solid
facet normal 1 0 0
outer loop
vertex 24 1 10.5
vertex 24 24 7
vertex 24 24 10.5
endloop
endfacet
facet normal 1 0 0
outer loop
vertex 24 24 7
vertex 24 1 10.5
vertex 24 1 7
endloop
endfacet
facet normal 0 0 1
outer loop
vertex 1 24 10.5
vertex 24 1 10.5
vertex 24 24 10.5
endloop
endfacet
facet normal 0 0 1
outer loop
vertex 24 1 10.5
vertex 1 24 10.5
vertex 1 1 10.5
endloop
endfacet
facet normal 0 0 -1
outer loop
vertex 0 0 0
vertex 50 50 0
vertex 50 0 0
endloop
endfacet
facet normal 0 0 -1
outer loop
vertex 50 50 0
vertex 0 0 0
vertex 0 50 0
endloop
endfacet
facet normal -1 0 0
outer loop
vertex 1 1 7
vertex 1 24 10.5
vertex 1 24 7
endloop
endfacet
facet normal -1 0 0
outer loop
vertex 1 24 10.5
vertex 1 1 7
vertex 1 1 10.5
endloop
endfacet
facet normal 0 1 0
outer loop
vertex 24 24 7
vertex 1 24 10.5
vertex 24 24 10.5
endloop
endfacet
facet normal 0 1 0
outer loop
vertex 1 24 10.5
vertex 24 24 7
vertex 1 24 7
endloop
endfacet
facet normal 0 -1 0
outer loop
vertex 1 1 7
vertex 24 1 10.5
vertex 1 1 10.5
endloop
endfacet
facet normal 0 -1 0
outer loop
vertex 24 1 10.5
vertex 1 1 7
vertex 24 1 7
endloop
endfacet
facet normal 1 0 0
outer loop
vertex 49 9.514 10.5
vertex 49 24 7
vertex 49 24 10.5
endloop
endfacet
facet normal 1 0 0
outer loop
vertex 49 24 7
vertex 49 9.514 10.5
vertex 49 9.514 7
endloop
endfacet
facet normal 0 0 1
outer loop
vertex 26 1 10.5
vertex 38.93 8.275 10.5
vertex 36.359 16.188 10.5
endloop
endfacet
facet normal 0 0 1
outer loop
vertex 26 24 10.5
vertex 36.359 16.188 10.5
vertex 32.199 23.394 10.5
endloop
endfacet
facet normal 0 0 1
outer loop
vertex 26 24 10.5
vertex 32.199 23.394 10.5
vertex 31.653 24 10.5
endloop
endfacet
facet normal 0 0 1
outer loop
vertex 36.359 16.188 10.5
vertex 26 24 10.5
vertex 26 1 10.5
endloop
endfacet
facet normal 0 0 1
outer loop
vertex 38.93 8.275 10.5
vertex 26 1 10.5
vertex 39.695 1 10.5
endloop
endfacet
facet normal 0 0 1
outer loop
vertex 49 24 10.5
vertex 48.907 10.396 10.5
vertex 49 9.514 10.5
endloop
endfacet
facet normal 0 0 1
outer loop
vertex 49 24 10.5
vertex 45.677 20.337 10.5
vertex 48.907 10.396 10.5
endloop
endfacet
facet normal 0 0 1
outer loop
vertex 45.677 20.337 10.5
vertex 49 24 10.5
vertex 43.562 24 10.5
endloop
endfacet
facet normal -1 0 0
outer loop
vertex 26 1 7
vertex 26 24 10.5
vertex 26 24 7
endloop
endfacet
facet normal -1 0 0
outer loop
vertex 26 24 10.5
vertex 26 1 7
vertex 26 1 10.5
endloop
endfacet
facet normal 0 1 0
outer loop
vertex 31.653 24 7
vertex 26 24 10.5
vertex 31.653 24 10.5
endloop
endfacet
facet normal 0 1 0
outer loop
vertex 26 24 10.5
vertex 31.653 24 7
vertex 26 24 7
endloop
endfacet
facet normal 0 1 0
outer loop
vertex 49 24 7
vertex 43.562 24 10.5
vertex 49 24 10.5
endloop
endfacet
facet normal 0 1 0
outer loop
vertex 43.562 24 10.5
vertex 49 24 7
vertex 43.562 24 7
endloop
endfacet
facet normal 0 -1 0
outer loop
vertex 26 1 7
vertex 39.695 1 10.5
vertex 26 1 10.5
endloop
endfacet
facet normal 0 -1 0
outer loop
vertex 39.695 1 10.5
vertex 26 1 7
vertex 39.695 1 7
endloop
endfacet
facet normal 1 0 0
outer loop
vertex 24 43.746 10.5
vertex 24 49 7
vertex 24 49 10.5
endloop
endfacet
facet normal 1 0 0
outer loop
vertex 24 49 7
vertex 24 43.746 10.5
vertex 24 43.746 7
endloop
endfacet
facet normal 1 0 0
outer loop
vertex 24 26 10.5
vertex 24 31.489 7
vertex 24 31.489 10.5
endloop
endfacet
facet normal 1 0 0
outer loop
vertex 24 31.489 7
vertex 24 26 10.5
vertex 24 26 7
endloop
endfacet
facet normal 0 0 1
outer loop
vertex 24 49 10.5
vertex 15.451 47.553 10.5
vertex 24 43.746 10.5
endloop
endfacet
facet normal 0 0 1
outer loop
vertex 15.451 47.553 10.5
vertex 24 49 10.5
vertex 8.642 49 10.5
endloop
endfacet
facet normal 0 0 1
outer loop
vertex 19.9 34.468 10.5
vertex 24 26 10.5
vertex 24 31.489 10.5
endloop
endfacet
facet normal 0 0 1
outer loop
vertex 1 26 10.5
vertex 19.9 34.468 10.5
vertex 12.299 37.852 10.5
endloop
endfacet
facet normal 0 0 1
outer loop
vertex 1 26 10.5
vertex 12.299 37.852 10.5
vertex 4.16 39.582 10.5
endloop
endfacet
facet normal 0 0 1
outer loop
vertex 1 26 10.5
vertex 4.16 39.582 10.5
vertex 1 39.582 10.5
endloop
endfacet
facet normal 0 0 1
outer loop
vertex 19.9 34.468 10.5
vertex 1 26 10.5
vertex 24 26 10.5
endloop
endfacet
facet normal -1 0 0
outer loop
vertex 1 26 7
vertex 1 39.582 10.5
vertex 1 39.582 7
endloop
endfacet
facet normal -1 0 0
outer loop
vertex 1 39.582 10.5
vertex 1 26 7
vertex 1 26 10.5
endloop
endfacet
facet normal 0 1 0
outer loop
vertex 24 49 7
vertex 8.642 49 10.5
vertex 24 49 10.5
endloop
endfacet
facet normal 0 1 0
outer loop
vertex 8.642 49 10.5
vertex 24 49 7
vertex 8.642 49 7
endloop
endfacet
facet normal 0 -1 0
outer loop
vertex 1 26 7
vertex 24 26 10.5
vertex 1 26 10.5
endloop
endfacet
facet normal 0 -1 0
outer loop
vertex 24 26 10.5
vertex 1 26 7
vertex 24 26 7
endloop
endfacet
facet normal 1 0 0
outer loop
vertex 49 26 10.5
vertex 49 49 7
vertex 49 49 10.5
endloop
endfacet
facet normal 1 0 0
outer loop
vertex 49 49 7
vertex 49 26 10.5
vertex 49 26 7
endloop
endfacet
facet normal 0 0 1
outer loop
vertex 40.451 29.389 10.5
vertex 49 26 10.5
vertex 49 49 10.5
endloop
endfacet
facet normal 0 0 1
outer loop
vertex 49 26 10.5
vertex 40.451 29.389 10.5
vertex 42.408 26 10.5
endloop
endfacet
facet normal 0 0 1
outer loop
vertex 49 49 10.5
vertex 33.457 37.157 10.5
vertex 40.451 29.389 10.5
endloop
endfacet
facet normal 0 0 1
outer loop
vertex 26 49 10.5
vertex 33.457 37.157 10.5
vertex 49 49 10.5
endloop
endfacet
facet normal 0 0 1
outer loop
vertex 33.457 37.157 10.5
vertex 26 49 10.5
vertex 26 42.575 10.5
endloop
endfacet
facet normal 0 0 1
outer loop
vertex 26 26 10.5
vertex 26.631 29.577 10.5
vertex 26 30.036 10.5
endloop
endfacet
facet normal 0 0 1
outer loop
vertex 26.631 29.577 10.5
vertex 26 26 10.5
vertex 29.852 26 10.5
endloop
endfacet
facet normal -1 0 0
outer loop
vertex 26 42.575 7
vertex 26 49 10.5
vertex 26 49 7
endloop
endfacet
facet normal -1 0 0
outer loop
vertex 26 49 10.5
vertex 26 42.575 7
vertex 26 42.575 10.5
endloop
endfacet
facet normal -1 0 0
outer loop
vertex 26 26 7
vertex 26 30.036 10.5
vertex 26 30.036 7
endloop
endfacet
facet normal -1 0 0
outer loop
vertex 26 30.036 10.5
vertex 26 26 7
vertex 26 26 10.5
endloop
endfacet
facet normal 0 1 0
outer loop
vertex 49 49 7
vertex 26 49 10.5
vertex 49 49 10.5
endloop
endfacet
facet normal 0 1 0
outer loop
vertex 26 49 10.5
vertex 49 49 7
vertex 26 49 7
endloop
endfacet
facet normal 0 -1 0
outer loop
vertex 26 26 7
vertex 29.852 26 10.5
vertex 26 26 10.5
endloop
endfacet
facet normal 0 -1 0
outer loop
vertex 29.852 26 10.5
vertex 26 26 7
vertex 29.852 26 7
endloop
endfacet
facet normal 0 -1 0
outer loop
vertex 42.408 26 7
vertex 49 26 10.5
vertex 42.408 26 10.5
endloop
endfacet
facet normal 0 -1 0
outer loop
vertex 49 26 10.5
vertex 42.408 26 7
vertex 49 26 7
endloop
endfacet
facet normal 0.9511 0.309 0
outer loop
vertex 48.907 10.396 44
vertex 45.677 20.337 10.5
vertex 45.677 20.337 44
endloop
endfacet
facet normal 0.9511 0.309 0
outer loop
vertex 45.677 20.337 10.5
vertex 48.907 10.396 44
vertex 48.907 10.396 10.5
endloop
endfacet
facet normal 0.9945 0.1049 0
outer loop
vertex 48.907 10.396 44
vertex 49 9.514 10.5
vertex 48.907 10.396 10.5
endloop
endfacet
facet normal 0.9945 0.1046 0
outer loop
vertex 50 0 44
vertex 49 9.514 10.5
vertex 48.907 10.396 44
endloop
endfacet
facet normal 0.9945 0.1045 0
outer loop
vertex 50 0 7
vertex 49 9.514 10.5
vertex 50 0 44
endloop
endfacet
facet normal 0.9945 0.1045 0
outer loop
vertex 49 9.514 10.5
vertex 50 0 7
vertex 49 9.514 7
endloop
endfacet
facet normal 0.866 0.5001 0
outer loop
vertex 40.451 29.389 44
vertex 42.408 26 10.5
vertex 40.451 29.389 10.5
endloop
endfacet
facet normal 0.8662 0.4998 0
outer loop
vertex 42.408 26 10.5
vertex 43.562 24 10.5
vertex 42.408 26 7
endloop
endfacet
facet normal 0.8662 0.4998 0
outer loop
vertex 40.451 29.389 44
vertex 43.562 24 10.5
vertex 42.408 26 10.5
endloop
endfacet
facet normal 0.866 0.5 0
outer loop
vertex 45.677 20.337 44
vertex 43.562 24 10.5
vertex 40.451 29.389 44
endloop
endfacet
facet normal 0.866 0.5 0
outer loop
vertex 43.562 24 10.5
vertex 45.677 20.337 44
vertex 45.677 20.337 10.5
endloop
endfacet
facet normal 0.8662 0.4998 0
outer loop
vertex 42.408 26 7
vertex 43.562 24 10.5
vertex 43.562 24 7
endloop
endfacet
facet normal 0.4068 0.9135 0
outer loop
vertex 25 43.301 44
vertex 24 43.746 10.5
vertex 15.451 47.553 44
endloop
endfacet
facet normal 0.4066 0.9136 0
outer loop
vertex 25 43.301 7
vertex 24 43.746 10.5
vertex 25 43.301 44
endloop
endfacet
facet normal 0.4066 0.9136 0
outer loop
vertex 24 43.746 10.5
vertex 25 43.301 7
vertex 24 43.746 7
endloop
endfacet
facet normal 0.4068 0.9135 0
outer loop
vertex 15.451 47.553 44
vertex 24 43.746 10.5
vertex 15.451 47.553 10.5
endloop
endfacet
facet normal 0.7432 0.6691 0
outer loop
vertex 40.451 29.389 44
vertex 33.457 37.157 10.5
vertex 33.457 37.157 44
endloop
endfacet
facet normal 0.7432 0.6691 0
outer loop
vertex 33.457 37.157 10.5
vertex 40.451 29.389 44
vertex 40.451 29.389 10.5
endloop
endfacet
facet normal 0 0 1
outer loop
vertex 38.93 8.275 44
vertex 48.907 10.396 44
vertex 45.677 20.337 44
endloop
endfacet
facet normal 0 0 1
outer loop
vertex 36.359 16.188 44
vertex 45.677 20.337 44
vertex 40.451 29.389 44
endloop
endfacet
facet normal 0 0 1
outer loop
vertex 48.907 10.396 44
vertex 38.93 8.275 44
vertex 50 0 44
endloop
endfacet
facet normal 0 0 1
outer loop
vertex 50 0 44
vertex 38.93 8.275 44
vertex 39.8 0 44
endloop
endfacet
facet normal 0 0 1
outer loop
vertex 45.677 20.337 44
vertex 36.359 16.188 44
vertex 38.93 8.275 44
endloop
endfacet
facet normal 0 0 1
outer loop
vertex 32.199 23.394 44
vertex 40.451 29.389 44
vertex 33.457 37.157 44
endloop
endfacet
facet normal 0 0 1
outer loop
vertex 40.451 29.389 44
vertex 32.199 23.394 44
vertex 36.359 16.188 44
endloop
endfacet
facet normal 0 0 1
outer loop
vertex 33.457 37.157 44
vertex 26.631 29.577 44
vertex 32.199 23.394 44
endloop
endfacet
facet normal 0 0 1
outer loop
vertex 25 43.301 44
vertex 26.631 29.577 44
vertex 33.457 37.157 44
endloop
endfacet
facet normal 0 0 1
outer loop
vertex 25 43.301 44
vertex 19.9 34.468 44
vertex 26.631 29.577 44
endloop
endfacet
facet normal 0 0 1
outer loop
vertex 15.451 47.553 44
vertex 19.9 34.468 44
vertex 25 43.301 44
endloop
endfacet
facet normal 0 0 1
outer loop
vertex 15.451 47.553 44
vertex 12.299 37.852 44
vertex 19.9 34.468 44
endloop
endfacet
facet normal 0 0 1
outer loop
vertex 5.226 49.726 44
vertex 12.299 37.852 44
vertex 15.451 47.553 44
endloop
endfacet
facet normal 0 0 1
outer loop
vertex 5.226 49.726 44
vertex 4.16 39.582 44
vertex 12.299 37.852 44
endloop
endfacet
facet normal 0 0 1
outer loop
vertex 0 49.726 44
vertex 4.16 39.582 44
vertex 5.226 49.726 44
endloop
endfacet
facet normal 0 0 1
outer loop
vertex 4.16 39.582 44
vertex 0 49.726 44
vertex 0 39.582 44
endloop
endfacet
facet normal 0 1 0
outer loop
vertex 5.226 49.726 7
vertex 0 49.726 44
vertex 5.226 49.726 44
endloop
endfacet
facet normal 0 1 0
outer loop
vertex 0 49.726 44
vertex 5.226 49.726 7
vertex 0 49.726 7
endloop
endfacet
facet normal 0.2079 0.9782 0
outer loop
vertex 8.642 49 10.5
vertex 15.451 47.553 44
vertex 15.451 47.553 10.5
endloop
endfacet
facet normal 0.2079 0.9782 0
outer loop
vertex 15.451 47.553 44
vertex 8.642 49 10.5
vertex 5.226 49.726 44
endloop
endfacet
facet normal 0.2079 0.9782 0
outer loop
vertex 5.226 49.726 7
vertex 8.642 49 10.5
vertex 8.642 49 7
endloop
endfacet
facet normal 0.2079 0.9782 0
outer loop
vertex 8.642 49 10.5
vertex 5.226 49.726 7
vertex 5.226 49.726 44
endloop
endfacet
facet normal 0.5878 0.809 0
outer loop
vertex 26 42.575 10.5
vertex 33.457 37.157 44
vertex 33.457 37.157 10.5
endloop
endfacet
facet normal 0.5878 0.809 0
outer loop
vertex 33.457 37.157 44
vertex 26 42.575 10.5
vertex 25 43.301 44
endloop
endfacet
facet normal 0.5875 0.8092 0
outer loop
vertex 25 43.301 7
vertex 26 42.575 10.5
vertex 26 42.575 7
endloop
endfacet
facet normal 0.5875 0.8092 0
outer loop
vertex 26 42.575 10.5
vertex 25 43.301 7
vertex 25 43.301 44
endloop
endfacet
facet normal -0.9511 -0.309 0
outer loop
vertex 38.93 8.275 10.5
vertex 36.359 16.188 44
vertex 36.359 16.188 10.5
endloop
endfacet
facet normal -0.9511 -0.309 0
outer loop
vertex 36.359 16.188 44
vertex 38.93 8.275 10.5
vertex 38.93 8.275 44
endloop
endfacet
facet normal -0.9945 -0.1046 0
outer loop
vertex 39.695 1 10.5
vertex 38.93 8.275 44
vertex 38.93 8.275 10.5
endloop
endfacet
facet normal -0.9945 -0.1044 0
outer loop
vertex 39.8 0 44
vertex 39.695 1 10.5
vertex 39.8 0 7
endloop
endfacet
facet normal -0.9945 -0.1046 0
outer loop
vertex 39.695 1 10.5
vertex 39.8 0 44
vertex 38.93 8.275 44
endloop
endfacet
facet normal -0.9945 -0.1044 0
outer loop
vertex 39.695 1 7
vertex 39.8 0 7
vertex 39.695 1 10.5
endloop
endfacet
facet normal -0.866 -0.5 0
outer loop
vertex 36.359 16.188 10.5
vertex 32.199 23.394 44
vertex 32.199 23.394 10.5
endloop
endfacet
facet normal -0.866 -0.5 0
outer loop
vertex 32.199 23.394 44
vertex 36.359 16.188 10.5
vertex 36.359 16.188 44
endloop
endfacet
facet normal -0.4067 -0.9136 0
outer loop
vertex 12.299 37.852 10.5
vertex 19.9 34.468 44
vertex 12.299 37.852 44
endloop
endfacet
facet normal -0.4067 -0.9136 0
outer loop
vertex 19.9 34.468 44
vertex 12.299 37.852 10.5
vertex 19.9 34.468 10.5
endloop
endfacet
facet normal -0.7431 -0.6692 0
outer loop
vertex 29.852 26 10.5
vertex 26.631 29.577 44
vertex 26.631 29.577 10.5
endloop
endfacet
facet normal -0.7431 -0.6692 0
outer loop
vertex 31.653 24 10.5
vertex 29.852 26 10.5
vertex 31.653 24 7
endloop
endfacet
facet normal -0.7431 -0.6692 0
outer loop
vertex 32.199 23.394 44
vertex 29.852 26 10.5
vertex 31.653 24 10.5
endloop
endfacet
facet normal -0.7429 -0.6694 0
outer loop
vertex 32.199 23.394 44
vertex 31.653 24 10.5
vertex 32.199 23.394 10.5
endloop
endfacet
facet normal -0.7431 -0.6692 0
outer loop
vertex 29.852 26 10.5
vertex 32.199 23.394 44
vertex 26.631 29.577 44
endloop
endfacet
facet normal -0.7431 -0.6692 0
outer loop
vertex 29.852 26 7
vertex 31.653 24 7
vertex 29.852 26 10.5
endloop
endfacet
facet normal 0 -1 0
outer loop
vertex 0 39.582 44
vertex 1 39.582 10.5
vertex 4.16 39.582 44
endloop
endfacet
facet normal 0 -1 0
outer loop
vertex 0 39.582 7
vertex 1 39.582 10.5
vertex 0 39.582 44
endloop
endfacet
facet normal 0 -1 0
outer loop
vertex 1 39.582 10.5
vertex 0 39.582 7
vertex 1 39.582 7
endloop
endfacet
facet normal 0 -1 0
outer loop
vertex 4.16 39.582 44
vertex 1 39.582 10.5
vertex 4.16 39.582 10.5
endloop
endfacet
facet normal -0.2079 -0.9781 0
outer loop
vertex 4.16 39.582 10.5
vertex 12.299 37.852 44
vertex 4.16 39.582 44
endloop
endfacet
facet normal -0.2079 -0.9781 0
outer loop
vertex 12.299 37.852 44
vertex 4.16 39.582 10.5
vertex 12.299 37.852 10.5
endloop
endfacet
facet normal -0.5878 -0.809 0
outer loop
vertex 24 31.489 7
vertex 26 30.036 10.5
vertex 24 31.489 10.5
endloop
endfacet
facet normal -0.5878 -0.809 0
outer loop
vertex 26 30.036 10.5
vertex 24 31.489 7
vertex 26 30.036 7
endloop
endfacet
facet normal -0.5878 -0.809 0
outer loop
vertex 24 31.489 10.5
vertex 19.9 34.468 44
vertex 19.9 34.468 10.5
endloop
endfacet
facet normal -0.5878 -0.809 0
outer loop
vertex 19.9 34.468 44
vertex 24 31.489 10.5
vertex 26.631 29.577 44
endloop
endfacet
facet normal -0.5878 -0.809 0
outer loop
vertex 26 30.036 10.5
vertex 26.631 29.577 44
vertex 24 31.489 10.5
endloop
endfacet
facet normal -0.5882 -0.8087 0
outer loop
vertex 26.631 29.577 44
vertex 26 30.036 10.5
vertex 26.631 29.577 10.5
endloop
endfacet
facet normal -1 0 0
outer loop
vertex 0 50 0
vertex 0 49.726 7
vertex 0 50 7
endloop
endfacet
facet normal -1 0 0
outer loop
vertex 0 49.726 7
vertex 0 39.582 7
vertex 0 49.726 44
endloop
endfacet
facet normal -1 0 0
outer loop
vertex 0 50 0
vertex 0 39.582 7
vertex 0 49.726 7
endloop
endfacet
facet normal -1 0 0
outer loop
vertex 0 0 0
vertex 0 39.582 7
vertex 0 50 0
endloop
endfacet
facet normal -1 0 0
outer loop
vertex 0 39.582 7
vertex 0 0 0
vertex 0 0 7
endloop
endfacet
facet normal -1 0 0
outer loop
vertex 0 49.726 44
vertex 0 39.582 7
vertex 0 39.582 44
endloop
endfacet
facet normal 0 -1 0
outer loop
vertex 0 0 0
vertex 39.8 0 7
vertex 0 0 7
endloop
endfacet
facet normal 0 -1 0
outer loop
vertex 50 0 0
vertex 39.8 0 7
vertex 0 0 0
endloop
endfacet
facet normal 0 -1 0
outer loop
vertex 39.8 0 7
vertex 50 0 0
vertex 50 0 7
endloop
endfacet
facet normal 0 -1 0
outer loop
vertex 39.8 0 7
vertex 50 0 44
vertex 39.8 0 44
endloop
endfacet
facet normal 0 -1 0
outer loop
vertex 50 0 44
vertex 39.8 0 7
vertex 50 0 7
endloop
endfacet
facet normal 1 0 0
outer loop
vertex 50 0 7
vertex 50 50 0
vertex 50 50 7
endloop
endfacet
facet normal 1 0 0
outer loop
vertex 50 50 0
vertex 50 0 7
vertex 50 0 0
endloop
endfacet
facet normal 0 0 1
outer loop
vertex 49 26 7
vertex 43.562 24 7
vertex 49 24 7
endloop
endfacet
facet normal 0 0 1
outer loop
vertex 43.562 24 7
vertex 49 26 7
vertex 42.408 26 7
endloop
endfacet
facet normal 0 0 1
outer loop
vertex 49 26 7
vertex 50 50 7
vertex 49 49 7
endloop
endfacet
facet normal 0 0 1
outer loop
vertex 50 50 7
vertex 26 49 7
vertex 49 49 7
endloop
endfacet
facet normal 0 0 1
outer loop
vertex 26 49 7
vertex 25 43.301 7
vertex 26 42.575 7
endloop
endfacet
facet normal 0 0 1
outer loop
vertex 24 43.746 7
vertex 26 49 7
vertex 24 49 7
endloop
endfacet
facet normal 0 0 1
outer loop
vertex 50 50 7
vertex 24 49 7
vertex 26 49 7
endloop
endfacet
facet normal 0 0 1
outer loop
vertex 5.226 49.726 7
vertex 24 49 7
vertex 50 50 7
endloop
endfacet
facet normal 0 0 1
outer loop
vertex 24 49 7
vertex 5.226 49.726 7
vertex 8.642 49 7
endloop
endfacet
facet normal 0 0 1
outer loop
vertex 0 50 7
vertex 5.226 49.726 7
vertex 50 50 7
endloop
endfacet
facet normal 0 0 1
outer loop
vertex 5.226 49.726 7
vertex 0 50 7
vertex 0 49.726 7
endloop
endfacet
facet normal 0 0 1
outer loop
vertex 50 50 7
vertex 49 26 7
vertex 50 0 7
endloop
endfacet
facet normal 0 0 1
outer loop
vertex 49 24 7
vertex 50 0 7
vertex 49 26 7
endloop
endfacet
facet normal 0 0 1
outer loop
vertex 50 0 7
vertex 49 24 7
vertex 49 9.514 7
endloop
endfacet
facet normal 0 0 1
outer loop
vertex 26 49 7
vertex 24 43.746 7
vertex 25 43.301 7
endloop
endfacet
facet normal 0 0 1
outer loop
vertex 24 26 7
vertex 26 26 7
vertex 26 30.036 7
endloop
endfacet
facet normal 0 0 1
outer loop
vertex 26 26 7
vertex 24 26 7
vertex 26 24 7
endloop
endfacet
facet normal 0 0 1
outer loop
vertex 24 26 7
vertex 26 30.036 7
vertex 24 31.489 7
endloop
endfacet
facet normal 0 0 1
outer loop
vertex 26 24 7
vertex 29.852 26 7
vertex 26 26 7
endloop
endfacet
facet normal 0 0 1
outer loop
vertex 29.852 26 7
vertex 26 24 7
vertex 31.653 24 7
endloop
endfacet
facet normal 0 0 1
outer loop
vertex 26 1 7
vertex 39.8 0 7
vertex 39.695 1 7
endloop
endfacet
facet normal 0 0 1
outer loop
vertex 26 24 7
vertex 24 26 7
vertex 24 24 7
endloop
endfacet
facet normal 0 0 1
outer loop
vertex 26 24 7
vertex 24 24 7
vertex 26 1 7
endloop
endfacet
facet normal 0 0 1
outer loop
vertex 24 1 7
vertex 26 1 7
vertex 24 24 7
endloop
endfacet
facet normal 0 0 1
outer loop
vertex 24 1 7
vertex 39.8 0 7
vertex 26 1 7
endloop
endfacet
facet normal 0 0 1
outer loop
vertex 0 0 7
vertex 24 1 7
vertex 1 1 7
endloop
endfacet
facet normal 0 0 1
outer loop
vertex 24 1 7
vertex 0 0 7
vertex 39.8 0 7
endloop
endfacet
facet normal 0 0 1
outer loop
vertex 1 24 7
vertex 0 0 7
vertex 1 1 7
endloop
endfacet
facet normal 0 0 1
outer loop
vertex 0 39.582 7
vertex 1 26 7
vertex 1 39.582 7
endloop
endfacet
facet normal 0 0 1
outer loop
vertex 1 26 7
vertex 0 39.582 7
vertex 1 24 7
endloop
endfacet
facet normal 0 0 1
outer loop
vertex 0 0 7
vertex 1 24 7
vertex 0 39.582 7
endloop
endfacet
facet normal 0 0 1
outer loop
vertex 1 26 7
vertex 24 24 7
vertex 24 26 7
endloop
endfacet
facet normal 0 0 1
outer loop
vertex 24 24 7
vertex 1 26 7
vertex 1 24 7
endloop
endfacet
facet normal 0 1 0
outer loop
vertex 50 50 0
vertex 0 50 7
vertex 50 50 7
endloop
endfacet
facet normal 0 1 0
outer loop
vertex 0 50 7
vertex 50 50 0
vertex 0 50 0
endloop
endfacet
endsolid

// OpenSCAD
color("LightGray") {
    translate([1,1,0]) cube([23,23,6+4.5]);
    translate([25+1,1,0]) cube([23,23,6+4.5]);
    translate([1,25+1,0]) cube([23,23,6+4.5]);
    translate([25+1,25+1,0]) cube([23,23,6+4.5]);
}
color("Grey") {
    cube([50,50,7]);
    intersection() {
        difference() {
            cylinder(50-6,50,50);
            translate([0,0,-1]) cylinder(52,50-10.2,50-10.2);
        }
        cube([50,50,50]);
    }
}
